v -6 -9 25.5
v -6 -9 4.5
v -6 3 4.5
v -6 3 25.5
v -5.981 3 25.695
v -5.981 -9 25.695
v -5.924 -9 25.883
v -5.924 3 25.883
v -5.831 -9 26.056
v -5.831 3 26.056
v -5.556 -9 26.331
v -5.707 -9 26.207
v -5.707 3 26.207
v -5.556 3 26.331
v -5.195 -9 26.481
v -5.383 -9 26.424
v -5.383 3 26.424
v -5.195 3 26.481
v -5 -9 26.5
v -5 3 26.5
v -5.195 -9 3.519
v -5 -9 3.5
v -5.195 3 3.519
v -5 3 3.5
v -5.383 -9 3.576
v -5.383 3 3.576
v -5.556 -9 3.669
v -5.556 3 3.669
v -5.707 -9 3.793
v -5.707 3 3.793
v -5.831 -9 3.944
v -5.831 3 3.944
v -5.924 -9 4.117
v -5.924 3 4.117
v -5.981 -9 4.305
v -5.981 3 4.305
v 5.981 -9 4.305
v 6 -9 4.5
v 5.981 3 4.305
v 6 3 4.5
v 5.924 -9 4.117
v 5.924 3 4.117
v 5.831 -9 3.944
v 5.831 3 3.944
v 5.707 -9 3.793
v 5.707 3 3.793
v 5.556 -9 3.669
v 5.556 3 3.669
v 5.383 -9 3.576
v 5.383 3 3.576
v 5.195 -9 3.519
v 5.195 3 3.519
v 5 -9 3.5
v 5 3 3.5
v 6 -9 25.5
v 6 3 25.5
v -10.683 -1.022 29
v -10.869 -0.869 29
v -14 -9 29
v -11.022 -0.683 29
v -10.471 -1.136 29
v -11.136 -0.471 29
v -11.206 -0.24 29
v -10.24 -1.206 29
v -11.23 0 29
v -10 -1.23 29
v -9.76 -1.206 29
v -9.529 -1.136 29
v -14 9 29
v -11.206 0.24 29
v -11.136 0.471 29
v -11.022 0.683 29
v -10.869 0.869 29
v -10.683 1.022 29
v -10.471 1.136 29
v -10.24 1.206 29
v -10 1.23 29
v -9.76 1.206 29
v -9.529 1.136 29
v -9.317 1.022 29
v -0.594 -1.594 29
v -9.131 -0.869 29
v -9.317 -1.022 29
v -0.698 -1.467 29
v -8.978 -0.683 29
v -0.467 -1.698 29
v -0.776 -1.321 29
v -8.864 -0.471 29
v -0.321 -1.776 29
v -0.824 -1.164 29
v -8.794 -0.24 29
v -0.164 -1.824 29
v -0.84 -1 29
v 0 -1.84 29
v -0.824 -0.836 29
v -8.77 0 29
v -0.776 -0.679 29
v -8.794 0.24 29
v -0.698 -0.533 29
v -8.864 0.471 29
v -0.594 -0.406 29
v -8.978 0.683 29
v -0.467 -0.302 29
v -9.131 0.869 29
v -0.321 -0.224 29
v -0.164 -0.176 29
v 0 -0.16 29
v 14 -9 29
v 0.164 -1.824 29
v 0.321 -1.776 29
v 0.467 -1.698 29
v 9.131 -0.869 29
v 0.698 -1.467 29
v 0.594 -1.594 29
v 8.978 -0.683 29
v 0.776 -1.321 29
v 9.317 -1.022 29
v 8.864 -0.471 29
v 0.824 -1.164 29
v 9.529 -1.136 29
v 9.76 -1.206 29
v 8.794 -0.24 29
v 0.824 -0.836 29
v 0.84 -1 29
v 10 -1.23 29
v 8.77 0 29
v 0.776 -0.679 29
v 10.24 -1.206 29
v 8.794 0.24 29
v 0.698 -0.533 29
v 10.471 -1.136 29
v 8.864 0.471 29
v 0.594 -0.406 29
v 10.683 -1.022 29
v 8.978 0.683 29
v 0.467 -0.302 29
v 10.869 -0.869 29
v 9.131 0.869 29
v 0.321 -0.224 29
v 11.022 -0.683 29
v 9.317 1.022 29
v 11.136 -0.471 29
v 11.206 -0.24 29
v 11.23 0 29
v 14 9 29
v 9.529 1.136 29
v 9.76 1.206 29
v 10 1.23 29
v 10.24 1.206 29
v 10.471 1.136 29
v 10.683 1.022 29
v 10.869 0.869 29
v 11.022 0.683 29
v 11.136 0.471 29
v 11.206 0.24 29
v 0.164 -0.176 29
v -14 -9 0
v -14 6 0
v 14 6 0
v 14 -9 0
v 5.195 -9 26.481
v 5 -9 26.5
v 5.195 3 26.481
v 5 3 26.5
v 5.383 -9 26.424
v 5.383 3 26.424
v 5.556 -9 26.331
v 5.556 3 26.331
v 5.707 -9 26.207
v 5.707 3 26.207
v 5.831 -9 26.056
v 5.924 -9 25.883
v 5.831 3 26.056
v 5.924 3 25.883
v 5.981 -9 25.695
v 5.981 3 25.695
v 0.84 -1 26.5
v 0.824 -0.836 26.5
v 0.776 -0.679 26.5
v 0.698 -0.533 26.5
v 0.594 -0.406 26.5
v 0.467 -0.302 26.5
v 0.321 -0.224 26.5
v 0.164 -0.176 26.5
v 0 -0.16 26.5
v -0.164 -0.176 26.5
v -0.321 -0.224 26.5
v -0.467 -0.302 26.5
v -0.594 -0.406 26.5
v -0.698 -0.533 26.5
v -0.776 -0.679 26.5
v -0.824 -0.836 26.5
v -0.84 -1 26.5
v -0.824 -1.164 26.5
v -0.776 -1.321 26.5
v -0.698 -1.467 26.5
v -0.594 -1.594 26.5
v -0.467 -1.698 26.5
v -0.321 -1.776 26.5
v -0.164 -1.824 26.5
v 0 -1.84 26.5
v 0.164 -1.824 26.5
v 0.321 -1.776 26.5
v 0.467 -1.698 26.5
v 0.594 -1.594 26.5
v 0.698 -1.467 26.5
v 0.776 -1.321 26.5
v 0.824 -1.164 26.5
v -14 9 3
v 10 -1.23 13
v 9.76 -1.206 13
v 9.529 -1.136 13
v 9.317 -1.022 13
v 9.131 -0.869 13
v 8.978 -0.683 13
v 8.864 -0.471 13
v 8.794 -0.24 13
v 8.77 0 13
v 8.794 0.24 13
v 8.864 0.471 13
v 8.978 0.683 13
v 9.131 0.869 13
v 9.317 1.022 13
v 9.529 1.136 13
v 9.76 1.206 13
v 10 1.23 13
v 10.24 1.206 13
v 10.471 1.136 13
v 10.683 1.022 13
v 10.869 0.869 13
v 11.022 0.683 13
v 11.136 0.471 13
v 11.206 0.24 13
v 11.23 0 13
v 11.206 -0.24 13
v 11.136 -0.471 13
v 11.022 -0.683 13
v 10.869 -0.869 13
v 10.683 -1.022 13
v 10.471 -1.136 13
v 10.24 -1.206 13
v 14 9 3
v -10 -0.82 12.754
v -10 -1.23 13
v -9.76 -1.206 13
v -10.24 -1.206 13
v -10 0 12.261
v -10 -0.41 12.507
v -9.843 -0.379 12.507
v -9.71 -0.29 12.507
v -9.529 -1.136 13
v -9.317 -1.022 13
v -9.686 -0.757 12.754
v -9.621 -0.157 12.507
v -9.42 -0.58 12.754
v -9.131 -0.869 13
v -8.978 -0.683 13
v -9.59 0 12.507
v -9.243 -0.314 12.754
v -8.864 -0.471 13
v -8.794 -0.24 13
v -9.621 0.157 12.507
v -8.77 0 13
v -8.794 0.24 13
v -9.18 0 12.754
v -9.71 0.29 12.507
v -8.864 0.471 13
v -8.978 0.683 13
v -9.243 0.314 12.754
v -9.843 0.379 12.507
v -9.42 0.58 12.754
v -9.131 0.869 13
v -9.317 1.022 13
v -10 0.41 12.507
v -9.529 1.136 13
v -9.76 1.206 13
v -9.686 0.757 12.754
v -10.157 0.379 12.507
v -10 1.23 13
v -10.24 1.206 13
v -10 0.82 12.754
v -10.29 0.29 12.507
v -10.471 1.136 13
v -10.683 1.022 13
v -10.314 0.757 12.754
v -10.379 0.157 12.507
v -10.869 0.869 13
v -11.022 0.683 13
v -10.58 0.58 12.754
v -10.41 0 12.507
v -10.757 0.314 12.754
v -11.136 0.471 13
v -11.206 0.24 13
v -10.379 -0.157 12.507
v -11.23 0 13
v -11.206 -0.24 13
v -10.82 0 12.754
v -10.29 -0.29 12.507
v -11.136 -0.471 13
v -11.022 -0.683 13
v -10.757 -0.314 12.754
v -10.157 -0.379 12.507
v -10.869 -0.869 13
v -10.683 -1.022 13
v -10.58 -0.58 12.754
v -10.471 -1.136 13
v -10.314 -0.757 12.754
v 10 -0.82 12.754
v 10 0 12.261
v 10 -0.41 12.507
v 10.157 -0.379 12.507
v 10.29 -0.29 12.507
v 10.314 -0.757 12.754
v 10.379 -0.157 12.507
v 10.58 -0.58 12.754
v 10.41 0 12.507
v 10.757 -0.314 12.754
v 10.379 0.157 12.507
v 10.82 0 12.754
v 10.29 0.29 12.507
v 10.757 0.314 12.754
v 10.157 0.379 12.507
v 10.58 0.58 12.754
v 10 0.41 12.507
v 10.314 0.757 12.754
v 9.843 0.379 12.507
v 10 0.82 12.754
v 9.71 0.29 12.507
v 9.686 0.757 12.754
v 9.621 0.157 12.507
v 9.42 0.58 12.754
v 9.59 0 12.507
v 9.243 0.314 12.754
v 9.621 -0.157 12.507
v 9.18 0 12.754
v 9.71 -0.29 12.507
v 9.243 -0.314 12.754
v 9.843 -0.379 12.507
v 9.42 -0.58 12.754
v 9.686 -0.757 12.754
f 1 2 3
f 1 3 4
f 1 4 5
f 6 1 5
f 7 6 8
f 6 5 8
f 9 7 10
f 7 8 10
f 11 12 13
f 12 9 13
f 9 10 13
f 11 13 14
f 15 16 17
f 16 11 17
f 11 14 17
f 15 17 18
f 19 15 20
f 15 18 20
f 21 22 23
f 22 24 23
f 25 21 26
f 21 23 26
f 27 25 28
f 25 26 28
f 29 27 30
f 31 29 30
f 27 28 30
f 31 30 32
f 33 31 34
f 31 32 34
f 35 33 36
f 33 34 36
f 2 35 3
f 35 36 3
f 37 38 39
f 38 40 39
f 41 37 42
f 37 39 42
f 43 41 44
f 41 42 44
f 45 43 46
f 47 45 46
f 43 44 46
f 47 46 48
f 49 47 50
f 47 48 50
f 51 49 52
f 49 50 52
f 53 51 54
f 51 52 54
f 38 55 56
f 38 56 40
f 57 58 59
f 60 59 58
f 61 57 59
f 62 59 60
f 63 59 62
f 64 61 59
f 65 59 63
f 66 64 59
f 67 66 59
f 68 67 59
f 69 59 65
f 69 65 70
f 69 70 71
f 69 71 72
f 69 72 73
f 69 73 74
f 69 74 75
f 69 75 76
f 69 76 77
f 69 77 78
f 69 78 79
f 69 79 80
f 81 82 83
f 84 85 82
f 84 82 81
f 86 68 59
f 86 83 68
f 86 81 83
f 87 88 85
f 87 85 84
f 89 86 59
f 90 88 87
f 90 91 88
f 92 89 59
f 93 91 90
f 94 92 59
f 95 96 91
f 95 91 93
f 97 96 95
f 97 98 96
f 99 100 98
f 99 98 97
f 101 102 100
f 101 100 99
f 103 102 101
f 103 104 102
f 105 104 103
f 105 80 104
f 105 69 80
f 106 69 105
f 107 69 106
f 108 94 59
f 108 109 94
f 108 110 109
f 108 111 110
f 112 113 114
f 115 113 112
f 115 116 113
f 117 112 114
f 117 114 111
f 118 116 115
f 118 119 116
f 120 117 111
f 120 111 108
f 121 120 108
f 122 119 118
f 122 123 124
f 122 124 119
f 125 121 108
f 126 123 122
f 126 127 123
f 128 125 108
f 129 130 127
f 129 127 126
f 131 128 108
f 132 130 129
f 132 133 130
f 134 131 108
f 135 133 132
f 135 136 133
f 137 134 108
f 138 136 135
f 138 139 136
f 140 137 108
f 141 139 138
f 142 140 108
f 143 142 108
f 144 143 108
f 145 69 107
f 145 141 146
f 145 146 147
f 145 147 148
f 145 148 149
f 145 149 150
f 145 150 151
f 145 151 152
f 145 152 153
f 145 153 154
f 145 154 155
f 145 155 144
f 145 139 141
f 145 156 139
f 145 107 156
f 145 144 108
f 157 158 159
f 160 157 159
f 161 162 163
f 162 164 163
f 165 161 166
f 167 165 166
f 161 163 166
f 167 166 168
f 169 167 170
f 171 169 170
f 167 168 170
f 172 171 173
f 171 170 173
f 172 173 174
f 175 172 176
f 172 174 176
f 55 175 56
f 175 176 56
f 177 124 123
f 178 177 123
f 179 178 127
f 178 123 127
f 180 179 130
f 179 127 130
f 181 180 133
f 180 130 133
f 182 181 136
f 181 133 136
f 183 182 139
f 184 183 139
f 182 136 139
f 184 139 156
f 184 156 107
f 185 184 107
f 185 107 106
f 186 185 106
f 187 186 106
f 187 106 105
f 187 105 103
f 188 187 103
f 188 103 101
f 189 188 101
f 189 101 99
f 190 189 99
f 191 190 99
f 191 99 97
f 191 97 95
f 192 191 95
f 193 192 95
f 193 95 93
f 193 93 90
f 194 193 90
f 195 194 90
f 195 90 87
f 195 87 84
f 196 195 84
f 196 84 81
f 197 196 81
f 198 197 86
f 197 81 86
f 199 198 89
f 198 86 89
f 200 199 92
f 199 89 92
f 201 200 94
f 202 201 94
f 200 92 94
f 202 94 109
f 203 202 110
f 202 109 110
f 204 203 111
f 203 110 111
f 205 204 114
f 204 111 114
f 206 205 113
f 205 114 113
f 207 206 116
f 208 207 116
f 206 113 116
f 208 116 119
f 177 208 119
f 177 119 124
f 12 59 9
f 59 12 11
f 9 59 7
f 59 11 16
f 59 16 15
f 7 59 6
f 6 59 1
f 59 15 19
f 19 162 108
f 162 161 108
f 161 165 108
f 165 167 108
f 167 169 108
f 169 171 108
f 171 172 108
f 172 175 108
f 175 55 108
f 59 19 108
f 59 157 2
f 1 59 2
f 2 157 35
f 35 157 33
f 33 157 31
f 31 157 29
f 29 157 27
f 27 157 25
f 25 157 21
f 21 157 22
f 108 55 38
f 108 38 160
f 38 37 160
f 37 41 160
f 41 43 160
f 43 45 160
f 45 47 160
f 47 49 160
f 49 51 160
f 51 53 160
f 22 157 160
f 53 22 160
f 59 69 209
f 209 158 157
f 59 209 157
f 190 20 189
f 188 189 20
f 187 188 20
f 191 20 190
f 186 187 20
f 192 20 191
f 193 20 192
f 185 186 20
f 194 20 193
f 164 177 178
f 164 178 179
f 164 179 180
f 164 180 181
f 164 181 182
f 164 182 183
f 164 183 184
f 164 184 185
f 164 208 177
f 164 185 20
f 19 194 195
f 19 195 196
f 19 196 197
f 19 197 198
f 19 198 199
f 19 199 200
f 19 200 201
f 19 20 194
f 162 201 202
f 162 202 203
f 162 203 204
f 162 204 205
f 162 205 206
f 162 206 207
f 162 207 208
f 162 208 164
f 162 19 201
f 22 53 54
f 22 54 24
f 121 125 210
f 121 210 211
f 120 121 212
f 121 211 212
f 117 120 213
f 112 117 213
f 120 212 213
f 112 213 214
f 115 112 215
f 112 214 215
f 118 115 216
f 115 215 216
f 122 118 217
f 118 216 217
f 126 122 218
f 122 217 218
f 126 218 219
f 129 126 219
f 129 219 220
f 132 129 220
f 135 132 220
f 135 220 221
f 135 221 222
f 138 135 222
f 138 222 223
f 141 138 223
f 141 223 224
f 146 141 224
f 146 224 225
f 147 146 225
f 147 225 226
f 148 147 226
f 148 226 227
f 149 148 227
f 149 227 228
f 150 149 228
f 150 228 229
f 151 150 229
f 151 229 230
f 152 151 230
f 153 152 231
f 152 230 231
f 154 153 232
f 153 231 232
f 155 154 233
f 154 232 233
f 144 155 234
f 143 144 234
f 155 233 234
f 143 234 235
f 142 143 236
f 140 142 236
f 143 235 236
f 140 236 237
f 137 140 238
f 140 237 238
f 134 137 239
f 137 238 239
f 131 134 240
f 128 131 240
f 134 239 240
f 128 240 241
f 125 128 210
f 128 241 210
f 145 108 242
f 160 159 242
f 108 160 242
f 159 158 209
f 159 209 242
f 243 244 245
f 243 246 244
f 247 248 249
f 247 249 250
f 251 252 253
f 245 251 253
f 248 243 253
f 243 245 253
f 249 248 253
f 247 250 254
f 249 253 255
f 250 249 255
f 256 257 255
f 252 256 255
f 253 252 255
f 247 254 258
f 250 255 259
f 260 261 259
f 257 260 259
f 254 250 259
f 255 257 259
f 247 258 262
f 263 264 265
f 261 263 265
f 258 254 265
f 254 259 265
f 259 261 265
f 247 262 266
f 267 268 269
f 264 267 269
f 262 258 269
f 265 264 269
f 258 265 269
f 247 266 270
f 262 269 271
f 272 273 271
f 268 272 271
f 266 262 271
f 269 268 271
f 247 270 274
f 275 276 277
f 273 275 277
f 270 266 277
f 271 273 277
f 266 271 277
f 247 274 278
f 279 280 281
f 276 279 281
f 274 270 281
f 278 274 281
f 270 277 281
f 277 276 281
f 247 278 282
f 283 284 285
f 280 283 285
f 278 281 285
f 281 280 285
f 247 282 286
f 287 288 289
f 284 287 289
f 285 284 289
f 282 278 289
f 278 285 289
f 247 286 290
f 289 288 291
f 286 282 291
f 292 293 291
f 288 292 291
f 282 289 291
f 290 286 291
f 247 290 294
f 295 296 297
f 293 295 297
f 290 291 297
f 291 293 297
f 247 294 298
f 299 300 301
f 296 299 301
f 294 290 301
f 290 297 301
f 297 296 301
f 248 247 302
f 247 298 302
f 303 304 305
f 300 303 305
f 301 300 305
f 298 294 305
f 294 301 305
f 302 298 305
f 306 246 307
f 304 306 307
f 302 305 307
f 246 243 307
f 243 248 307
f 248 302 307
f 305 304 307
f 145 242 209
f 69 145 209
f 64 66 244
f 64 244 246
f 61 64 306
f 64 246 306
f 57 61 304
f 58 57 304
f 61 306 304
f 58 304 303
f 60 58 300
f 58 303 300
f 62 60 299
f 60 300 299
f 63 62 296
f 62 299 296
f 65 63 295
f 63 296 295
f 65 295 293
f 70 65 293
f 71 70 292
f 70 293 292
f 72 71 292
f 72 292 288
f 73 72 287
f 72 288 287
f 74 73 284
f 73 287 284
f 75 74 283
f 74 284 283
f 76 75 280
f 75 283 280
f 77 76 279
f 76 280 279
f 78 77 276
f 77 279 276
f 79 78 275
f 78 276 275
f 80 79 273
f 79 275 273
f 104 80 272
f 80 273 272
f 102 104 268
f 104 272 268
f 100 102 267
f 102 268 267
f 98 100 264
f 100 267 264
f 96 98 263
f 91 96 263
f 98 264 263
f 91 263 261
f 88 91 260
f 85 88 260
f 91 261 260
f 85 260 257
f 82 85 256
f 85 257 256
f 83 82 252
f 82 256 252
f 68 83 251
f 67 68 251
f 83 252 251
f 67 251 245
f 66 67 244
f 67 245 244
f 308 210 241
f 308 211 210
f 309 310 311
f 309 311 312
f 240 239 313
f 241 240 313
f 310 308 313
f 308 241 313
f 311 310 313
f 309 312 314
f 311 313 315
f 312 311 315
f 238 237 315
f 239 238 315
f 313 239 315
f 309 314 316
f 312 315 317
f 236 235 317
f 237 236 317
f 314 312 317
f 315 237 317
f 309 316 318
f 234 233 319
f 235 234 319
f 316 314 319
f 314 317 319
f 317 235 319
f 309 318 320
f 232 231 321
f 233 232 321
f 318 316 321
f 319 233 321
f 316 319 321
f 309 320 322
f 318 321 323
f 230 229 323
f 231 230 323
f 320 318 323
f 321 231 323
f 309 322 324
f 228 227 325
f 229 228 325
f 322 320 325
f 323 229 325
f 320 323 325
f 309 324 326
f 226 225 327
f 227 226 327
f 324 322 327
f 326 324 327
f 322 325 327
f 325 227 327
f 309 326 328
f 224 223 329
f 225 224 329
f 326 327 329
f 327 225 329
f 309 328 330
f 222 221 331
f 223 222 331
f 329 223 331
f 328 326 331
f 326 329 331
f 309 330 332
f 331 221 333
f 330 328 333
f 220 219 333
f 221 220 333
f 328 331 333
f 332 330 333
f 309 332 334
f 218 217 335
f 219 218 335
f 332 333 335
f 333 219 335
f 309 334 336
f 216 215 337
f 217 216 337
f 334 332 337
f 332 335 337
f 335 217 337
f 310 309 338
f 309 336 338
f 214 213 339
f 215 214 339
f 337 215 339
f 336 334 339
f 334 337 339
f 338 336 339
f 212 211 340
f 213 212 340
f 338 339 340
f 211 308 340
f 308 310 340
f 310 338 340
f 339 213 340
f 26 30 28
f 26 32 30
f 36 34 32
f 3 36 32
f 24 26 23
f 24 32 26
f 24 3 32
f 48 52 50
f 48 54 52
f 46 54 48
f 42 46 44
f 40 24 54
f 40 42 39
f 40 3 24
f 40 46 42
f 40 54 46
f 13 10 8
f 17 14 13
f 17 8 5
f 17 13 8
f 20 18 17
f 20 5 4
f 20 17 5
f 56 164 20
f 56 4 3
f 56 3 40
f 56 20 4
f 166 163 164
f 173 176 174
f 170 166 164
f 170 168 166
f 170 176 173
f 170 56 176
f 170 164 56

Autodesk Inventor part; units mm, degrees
ref_plane "YZ Plane" through (0, 0, 0) normal (1, 0, 0) x (0, 1, 0)
ref_plane "XZ Plane" through (0, 0, 0) normal (0, 1, 0) x (-1, 0, 0)
ref_plane "XY Plane" through (0, 0, 0) normal (0, 0, 1) x (1, 0, 0)
sketch "Esboço1" plane through (0, 0, 0) normal (0, 0, 1) x (1, 0, 0)
  line L0 (-14, -9) -> (14, -9)
  line L1 (14, -9) -> (14, 9)
  line L2 (14, 9) -> (-14, 9)
  line L3 (-14, 9) -> (-14, -9)
  line L4 (-14, -9) -> (14, 9) construction
  line L5 (14, -9) -> (-14, 9) construction
  point P0 (0, 0)
  dimension "d0" = 18
  dimension "d3" = 28
extrude "Extrusão1" add sketch "Esboço1" along normal blind 29
sketch "Esboço2" plane through (0, 0, 29) normal (0, 0, 1) x (1, 0, 0)
  circle A0 centre (0, -1) radius 0.84
  line L0 (-14, -9) -> (14, -9) projected
  point P0 (0, 0)
  dimension "d4" = 1.68
  dimension "d5" = 8
extrude "Extrusão2" cut sketch "Esboço2" against normal blind 20
sketch "Esboço3" plane through (-14, -9, 0) normal (0, -1, 0) x (1, 0, 0)
  line L0 (8, 26.5) -> (20, 26.5)
  line L1 (20, 26.5) -> (20, 3.5)
  line L2 (20, 3.5) -> (8, 3.5)
  line L3 (8, 3.5) -> (8, 26.5)
  line L4 (0, 29) -> (28, 29) projected
  line L5 (0, 0) -> (28, 0) projected
  point P0 (14, 0)
  point P1 (14, 0)
  point P2 (14, 3.5)
  dimension "d8" = 2.5
  dimension "d9" = 12
  dimension "d10" = 0
  dimension "d11" = 23
extrude "Extrusão3" cut sketch "Esboço3" against normal blind 12
sketch "Esboço4" plane through (0, 0, 29) normal (0, 0, 1) x (1, 0, 0)
  line L0 (-14, 9) -> (-14, -9) projected
  line L1 (14, -9) -> (14, 9) projected
  point P0 (0, 0)
  point P1 (-10, 0)
  point P2 (10, 0)
  point P3 (-6, -9)
  point P4 (6, -9)
  dimension "d14" = 4
  dimension "d15" = 4
hole "Furo1" at (10, 0, 29) at (-10, 0, 29) direction (0, 0, -1) diameter 2.459 depth 16 tip angle 118 thread size "M3x0.5" class "6H" standard "ISO Metric profile"
chamfer "Chanfro1" distance 3 angle 45 1 edges at (0, 9, 0)
fillet "Arredondamento1" radius 1 4 edges at (6, -3, 26.5) (-6, -3, 26.5) (-6, -3, 3.5) (6, -3, 3.5)
properties part number "CASE PROT IR" material "Poliacetal"
